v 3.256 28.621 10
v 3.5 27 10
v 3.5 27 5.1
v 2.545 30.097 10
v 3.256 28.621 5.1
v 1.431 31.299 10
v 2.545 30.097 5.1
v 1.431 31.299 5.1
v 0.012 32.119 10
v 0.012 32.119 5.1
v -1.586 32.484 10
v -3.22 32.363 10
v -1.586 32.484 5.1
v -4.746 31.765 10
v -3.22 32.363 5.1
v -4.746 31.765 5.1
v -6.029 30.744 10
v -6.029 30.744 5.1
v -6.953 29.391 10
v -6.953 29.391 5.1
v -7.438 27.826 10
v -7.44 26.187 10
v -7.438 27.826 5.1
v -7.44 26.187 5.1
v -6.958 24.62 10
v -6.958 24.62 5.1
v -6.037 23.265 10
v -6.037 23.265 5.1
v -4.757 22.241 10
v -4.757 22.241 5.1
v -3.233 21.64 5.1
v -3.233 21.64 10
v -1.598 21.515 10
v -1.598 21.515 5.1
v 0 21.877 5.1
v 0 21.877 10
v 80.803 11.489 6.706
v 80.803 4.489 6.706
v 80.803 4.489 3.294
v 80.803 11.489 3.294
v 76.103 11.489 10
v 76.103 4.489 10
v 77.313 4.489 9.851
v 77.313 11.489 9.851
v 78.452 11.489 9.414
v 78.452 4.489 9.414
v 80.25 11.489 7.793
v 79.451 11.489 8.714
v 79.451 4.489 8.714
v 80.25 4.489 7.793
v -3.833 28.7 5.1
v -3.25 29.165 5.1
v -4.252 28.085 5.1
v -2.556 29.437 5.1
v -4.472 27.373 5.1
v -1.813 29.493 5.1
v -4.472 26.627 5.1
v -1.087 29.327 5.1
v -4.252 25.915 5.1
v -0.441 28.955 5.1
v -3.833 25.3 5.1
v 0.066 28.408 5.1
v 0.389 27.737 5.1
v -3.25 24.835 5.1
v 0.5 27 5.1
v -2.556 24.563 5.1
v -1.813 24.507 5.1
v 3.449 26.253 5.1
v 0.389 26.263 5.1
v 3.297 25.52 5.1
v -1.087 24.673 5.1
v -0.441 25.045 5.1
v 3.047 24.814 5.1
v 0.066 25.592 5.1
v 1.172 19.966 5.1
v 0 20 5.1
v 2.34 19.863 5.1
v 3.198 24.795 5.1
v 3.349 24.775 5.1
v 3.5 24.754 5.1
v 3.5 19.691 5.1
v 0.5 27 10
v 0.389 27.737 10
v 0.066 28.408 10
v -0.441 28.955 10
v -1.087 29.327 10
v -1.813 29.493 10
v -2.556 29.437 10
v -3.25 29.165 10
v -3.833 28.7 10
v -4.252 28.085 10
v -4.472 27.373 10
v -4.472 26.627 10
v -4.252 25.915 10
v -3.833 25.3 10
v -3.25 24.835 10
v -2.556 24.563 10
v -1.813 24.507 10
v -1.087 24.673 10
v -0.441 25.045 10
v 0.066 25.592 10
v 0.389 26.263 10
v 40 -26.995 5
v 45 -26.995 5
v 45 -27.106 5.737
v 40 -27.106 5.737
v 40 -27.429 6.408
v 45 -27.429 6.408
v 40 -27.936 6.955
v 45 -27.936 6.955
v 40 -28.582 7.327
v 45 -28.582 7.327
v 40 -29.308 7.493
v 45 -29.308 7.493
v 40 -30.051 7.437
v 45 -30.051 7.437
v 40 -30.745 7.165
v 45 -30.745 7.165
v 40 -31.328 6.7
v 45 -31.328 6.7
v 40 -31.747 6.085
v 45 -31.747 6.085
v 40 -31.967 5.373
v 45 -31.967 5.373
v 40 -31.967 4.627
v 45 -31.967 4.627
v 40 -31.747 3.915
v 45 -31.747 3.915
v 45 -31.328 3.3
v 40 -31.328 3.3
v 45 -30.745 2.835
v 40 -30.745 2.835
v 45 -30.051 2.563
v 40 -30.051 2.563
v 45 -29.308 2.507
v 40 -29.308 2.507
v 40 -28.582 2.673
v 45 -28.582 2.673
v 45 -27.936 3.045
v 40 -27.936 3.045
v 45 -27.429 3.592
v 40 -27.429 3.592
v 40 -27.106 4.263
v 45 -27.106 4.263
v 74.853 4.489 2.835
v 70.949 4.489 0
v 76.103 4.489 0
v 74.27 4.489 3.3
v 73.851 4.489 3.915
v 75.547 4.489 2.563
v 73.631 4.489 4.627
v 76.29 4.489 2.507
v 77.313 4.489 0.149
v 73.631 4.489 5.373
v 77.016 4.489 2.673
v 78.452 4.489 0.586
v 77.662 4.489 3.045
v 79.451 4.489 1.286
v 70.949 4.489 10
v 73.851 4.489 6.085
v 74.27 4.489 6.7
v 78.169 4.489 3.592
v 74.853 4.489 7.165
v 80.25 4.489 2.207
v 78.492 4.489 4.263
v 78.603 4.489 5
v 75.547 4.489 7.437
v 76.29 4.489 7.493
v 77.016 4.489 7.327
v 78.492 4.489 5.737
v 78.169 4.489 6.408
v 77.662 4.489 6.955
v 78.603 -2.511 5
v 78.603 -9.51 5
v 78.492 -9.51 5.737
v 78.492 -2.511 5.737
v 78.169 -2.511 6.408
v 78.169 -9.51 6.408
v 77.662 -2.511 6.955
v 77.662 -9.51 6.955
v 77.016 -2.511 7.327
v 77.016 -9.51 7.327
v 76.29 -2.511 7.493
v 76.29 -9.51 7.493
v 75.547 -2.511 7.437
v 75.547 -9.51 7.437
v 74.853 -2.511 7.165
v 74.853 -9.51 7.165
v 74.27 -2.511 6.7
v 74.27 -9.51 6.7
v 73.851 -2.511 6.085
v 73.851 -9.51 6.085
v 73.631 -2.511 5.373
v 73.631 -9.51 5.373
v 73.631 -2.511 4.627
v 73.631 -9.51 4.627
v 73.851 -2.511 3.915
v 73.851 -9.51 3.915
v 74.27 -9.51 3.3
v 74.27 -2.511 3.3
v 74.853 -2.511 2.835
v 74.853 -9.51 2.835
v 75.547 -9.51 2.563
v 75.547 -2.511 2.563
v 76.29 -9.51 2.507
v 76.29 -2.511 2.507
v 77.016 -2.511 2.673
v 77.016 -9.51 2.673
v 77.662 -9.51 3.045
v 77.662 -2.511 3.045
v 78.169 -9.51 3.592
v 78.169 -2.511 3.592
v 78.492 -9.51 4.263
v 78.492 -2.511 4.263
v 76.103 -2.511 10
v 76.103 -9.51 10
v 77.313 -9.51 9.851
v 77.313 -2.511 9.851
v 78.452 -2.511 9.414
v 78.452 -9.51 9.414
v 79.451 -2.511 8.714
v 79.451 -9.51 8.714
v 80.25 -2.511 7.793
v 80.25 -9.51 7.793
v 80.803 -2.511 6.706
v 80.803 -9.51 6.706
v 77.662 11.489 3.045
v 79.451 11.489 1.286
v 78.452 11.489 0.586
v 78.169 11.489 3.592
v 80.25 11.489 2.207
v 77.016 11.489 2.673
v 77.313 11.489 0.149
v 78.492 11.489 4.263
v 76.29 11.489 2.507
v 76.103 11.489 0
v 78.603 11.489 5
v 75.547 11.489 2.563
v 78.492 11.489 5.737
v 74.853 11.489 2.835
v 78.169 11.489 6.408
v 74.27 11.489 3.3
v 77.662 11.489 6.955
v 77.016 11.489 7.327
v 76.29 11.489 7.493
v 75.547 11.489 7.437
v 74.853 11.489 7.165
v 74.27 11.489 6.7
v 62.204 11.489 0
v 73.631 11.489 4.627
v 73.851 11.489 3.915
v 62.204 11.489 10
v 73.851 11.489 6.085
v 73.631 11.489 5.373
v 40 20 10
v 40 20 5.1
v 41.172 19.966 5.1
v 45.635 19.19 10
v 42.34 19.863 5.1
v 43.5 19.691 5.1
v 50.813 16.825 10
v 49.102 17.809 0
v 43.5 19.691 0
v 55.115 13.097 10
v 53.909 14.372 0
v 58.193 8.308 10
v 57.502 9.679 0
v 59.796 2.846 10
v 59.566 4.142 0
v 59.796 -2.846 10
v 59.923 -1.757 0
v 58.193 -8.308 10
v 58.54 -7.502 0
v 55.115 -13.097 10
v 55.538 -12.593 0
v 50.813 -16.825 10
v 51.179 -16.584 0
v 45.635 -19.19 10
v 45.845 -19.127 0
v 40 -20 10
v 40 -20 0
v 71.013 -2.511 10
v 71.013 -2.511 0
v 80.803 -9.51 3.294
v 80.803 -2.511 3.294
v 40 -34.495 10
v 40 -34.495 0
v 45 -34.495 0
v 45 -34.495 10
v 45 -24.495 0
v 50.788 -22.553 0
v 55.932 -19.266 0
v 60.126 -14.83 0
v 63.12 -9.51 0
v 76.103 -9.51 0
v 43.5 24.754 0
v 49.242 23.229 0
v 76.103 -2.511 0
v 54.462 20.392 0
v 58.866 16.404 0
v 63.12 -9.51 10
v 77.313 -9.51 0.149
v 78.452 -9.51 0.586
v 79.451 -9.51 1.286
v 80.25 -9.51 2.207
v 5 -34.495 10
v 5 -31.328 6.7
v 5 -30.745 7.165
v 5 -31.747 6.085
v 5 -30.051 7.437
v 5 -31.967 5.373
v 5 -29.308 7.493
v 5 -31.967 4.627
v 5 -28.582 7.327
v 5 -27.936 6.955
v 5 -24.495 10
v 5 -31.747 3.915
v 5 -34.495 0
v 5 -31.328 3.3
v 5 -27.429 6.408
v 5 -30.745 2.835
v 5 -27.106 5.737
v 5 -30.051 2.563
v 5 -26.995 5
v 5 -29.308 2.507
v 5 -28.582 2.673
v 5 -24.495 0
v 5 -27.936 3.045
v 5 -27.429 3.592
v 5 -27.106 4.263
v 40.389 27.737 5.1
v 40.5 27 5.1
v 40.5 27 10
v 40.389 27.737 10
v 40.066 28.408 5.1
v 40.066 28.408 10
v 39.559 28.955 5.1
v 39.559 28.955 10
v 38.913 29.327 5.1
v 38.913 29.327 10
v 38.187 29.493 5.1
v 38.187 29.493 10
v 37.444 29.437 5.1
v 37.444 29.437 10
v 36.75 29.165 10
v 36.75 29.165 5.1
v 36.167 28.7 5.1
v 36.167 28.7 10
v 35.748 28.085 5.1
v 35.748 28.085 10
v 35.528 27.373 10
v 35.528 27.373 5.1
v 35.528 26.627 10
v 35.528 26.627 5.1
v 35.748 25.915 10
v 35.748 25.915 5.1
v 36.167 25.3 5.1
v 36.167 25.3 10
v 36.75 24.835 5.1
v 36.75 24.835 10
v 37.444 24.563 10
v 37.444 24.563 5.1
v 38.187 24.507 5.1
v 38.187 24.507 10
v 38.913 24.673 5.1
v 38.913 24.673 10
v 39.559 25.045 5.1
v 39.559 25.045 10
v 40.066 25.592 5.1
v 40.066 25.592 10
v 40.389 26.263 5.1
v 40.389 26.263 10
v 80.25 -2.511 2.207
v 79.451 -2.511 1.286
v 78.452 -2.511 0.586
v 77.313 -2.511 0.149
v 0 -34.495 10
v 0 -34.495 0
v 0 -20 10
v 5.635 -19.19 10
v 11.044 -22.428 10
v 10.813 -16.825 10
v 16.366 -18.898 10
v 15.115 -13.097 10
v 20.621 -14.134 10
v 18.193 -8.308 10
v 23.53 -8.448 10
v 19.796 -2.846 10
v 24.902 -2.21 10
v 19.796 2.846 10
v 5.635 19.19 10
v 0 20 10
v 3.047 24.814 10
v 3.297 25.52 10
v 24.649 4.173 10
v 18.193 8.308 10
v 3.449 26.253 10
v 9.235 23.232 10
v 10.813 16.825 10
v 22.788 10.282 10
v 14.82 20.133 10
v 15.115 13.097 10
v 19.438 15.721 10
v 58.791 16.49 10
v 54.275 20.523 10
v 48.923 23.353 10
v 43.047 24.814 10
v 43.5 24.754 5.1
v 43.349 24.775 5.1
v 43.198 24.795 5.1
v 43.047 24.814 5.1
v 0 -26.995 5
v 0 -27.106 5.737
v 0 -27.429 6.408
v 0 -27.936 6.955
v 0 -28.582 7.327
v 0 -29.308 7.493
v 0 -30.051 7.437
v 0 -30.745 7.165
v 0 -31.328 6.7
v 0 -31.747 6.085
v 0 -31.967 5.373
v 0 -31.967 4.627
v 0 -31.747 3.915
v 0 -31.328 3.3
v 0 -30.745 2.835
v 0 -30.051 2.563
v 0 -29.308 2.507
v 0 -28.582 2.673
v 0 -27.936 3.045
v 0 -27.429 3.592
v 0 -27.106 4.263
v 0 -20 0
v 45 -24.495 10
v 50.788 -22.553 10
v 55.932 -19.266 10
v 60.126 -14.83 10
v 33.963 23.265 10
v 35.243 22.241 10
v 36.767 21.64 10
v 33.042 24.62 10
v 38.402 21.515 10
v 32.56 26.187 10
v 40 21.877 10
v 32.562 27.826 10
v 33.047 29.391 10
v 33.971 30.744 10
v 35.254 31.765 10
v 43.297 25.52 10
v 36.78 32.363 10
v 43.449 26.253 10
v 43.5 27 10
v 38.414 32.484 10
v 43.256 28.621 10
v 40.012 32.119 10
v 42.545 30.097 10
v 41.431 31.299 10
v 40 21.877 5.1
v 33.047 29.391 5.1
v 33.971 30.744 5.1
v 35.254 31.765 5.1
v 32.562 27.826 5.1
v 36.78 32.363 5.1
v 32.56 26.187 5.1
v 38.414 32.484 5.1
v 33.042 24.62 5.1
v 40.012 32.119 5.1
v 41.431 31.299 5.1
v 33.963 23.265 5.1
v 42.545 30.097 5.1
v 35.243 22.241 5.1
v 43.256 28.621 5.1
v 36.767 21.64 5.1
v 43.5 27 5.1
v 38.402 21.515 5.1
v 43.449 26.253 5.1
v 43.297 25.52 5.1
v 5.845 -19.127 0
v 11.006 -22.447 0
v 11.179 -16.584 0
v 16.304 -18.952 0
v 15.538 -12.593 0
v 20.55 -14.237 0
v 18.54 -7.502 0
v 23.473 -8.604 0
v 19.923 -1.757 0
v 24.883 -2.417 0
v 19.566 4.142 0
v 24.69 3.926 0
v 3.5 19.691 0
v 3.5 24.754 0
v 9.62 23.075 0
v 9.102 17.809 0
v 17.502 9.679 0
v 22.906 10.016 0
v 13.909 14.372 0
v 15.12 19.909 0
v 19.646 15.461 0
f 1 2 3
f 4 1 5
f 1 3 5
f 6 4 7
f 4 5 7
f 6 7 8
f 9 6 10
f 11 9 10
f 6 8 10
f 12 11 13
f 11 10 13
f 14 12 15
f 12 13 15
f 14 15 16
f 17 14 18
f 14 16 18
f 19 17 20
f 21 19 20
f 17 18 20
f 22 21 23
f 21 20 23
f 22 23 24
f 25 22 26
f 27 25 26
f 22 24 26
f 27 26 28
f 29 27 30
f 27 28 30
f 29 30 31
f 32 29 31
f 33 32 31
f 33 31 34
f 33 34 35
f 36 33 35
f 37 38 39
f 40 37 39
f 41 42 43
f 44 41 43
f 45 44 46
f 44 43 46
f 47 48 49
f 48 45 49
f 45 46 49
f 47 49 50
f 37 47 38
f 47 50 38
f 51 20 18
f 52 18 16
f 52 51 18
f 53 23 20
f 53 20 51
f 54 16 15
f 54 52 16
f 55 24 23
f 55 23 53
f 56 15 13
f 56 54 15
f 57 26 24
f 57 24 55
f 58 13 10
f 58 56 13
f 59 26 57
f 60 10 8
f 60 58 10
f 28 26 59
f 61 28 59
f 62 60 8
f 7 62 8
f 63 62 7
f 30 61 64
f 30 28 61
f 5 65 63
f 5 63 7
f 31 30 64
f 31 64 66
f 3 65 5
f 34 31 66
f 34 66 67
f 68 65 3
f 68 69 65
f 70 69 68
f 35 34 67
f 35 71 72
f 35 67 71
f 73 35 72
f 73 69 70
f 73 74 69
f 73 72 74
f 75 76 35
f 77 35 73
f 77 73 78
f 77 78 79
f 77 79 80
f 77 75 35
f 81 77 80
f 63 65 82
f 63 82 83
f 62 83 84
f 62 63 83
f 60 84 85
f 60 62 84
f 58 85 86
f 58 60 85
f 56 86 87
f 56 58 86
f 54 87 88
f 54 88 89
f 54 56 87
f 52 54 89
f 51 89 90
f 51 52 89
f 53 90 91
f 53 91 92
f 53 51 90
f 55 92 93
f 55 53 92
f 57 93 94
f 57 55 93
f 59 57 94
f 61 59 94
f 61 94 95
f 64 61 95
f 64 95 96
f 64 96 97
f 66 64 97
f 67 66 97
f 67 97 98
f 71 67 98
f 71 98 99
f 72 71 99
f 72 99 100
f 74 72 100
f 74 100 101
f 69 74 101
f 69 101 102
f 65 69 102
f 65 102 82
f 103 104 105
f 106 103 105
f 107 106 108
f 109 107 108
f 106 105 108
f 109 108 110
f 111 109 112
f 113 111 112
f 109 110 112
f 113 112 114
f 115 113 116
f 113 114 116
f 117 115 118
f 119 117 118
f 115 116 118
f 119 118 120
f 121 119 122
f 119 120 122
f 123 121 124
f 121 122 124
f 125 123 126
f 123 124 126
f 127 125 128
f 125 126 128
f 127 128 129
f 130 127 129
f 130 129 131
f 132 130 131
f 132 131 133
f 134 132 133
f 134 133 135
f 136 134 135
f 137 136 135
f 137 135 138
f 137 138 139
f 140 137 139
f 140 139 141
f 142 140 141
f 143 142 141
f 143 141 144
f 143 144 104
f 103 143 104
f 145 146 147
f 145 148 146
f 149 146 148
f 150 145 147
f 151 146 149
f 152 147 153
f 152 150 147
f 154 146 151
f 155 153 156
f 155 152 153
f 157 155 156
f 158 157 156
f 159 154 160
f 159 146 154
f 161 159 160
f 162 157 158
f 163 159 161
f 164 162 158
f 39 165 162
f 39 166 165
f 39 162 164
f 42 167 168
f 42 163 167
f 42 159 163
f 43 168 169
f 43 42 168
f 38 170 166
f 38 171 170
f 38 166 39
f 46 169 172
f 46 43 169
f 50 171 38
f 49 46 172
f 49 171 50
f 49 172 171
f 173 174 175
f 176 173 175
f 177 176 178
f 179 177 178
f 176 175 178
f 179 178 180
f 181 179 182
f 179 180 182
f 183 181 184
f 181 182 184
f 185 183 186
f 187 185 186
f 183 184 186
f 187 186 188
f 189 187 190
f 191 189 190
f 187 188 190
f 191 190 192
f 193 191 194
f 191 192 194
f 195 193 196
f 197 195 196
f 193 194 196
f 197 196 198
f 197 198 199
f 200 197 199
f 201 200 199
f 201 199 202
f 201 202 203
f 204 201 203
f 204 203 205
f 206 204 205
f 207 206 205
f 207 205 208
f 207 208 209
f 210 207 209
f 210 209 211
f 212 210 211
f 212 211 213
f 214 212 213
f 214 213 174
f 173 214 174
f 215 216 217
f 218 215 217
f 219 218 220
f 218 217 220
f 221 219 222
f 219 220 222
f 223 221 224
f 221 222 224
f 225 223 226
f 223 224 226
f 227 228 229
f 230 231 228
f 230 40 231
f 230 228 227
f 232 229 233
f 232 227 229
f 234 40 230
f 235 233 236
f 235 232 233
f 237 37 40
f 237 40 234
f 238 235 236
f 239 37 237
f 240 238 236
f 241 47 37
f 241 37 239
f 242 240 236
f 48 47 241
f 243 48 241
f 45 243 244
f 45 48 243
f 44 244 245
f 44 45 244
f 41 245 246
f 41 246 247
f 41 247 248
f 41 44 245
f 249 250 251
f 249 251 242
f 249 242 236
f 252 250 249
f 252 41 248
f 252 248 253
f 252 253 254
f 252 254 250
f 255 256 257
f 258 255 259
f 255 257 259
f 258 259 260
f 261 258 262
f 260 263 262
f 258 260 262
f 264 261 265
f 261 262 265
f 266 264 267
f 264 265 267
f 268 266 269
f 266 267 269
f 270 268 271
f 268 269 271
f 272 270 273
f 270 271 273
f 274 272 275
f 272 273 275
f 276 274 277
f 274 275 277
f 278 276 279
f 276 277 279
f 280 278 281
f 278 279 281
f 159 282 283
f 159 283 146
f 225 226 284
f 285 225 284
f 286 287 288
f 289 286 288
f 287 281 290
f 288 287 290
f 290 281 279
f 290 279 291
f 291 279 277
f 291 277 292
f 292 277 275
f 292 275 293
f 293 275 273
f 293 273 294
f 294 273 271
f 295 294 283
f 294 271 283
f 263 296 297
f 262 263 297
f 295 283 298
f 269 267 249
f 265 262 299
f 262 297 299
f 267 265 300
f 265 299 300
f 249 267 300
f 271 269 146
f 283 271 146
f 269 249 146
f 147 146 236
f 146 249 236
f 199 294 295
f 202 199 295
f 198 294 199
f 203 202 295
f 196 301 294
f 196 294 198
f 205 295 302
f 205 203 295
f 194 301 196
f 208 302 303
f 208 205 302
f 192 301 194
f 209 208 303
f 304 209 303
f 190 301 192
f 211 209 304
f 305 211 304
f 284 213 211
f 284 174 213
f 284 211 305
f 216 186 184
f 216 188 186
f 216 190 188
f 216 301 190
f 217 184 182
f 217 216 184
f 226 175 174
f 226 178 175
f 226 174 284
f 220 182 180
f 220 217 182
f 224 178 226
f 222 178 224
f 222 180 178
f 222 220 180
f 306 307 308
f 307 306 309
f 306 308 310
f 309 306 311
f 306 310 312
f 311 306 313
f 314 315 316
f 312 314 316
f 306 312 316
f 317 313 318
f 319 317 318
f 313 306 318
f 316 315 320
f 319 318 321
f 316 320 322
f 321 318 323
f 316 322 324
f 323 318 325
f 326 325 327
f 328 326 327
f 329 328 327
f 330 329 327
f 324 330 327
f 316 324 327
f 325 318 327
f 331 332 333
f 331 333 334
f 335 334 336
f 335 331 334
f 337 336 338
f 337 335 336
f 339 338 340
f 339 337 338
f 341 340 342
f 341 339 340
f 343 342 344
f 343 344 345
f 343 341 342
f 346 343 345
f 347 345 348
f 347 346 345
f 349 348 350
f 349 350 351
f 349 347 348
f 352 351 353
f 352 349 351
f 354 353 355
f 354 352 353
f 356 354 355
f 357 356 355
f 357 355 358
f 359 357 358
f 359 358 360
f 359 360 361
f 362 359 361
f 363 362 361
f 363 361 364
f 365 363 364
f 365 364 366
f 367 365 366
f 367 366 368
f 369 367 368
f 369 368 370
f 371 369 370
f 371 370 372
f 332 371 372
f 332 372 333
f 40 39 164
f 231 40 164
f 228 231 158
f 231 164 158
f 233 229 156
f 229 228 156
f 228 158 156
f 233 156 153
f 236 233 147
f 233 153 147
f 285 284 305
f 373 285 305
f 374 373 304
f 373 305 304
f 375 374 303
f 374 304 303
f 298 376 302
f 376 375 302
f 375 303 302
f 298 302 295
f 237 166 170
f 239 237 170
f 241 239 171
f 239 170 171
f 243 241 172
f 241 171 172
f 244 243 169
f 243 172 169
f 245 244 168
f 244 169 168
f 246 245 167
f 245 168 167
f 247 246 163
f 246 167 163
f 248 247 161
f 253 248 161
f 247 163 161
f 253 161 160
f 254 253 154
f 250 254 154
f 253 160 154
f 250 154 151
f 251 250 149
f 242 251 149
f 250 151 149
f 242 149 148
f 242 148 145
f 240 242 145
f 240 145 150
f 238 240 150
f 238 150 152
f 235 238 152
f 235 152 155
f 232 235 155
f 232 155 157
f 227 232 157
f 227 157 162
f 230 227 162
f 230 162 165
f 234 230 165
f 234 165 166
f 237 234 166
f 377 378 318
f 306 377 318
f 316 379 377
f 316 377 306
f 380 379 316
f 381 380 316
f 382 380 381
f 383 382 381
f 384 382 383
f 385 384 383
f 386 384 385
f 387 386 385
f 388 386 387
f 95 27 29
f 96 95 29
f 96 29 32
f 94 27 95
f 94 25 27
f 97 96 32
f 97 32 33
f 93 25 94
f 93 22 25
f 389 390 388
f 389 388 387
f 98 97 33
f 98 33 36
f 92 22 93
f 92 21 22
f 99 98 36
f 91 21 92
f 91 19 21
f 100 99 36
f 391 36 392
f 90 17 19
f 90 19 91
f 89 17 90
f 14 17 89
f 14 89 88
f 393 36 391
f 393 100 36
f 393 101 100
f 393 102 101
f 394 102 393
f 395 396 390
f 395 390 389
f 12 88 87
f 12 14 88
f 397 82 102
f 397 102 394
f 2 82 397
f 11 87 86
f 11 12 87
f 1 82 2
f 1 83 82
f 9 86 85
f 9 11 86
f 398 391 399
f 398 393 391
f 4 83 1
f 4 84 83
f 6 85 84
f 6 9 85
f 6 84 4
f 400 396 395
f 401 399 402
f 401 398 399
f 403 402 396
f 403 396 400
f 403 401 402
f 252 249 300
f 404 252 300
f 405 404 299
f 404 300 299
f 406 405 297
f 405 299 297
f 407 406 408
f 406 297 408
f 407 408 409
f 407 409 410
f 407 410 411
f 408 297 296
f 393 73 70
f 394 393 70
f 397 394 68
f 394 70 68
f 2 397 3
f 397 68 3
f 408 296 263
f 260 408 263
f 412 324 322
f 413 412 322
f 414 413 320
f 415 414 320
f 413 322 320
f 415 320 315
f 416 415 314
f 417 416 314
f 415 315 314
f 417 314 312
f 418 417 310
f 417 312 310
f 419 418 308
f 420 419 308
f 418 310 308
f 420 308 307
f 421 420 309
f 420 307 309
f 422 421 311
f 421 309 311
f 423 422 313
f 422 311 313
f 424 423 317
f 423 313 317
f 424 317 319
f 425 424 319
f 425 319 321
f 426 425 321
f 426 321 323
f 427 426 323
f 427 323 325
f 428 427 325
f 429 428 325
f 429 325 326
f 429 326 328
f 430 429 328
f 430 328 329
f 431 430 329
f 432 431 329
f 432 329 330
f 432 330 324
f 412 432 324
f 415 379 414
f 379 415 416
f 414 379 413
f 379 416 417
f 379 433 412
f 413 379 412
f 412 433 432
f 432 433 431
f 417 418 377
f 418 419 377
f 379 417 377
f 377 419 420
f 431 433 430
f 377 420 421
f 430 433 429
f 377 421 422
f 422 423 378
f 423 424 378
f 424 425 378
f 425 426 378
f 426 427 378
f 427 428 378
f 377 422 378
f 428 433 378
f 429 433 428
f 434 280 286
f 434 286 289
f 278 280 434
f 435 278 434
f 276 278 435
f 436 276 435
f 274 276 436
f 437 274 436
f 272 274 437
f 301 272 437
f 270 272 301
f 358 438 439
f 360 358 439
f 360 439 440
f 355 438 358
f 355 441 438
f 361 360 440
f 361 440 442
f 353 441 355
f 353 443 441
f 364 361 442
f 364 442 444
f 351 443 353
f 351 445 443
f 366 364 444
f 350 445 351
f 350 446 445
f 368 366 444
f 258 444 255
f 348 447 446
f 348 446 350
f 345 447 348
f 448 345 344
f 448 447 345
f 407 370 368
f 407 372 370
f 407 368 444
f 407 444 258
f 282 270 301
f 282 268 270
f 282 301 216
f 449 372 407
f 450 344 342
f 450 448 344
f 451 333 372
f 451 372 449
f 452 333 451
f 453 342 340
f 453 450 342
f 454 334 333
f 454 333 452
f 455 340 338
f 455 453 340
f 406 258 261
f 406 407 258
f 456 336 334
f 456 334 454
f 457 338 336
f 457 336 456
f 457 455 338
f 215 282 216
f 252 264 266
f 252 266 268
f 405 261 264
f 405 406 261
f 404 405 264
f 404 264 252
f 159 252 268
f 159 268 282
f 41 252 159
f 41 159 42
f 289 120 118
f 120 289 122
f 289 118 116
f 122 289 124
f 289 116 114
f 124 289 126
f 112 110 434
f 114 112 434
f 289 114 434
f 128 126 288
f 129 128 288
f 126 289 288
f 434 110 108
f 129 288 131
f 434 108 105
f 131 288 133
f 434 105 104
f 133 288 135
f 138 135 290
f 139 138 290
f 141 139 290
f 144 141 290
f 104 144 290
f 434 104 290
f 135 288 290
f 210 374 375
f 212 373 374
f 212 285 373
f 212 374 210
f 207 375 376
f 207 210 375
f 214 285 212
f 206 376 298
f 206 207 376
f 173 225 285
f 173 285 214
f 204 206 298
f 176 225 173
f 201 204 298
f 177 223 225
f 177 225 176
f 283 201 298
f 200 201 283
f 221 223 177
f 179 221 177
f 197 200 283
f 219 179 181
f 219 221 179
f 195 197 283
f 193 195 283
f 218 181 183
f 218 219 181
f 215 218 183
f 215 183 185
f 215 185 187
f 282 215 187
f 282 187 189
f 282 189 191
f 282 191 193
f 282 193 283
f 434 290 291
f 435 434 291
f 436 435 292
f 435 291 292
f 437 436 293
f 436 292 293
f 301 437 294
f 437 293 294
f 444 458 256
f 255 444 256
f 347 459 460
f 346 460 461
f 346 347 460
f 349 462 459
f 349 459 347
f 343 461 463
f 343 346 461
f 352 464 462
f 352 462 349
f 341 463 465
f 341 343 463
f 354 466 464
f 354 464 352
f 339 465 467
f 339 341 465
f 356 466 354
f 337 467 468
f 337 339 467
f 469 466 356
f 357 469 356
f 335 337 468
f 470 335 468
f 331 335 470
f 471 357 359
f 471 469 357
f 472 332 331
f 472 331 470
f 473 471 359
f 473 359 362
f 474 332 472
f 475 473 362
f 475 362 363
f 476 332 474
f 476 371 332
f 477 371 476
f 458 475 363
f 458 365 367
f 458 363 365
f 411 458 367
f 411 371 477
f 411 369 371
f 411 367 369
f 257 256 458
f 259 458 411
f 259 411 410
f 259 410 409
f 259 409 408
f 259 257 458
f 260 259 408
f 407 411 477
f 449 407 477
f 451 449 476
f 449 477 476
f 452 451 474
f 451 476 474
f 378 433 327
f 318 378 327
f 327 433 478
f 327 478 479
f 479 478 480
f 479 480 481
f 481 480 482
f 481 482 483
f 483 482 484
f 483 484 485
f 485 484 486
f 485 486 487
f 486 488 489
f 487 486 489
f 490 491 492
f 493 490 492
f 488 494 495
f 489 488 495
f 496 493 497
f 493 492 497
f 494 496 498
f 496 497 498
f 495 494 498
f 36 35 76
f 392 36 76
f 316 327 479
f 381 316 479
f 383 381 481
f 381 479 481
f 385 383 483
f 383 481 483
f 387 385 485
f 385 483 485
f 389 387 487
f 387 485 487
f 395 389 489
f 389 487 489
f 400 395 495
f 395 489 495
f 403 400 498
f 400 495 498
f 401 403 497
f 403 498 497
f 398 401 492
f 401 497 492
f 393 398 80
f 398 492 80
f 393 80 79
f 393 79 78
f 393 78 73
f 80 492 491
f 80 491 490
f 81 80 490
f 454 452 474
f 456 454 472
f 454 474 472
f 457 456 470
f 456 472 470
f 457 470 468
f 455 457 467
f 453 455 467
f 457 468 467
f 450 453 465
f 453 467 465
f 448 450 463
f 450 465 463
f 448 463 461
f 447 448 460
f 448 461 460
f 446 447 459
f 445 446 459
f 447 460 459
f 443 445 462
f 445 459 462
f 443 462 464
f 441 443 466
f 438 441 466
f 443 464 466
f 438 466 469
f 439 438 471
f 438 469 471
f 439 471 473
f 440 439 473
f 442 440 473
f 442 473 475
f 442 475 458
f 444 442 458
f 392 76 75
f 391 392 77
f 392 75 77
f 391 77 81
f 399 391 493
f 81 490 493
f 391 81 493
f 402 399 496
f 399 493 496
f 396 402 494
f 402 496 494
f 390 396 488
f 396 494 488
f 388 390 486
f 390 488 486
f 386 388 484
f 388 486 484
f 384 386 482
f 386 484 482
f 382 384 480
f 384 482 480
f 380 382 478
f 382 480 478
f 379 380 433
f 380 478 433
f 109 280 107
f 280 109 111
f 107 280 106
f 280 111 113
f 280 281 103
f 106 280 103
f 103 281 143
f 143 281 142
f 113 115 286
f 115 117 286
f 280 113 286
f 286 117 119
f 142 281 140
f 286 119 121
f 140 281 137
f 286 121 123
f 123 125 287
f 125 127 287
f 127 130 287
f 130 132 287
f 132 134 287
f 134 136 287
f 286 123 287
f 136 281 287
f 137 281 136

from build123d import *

# Parameters (mm, degrees)
F0_R      = 2.5
F1_DEPTH  = 10
F3_DEPTH  = 5.1
F4_R      = 2.5
F5_DEPTH  = 25
F8_DEPTH  = 10
F9_R      = 2.5
F10_DEPTH = 25
F12_DEPTH = 25


with BuildPart() as f1:
    # F0 (on Top) → F1 (new body)
    with BuildSketch(Plane.XY):
        with BuildLine():
            ThreePointArc((0, 20), (20, 0), (0, -20))
            Line((0, -20), (0, -25))
            Line((0, -25), (0, -34.4948974278))
            Line((0, -34.4948974278), (5, -34.4948974278))
            Line((5, -34.4948974278), (5, -24.4948974278))
            ThreePointArc((5, -24.4948974278), (24.9804087413, 0.9895347988), (3.0467684263, 24.8136495131))
            ThreePointArc((3.0467684263, 24.8136495131), (1.8171863954, 23.0403171815), (0, 21.876524617))
            Line((0, 21.876524617), (0, 20))
        make_face()
        with BuildLine():
            ThreePointArc((3.5, 27), (-6.5414755311, 30.1024184115), (0, 21.876524617))
            Line((0, 21.876524617), (0, 25))
            ThreePointArc((0, 25), (1.526231007, 24.9533688891), (3.0467684263, 24.8136495131))
            ThreePointArc((3.0467684263, 24.8136495131), (3.3855002713, 25.8835830403), (3.5, 27))
        make_face()
        with Locations((-2, 27)):
            Circle(F0_R, mode=Mode.SUBTRACT)
        with BuildLine():
            Line((0, 25), (0, 21.876524617))
            ThreePointArc((0, 21.876524617), (1.8171863954, 23.0403171815), (3.0467684263, 24.8136495131))
            ThreePointArc((3.0467684263, 24.8136495131), (1.526231007, 24.9533688891), (0, 25))
        make_face()
    extrude(amount=F1_DEPTH)

    # F2 (on face) → F3 (cut)
    with BuildSketch(Plane(origin=(0, 0, 0), x_dir=(1, 0, 0), z_dir=(0, 0, -1))):
        with BuildLine():
            ThreePointArc((0, -21.876524617), (-6.5414755311, -30.1024184115), (3.5, -27))
            Line((3.5, -27), (3.5, -15.0508275256))
            Line((3.5, -15.0508275256), (0, -15.0508275256))
            Line((0, -15.0508275256), (0, -21.876524617))
        make_face()
    extrude(amount=-F3_DEPTH, mode=Mode.SUBTRACT)

    # F4 (on face) → F5 (cut)
    with BuildSketch(Plane.YZ.offset(5)):
        with Locations((-29.4948974278, 5)):
            Circle(F4_R)
    extrude(amount=-F5_DEPTH, mode=Mode.SUBTRACT)


with BuildPart() as f6_1:
    # F6: copy of F1
    add(f1.part.moved(Location((40, 0, 0))))

    # F7 (on face) → F8 (join)
    with BuildSketch(Plane.XY.offset(10)):
        Polygon((61.0121913655, -2.5110482576), (61.0760738386, -9.5104652012), (71.0764903249, -9.5104652012), (81.1029541338, -9.5104652012), (81.0126078518, -2.5110482576), (71.0126078518, -2.5110482576), (70.9487227179, 4.4886602141), (80.8852514097, 4.4886602141), (80.8852514097, 11.4886602141), (60.8844184371, 11.4886602141), (60.9483062317, 4.4886602141), align=None)
    extrude(amount=-F8_DEPTH)

    # F9 (on face) → F10 (cut)
    with BuildSketch(Plane.XZ.offset(9.5104652012)):
        with Locations((76.1029541338, 5)):
            Circle(F9_R)
    extrude(amount=-F10_DEPTH, mode=Mode.SUBTRACT)

    # F11 (on face) → F12 (cut)
    with BuildSketch(Plane.XZ.offset(9.5104652012)):
        with BuildLine():
            ThreePointArc((80.8029541338, 6.7058722109), (81.0273830347, 5.8660254038), (81.1029541338, 5))
            Line((81.1029541338, 5), (81.1029541338, 10))
            Line((81.1029541338, 10), (80.8029541338, 10))
            Line((80.8029541338, 10), (80.8029541338, 6.7058722109))
        make_face()
        with BuildLine():
            ThreePointArc((76.1029541338, 10), (78.9726787674, 9.094469505), (80.8029541338, 6.7058722109))
            Line((80.8029541338, 6.7058722109), (80.8029541338, 10))
            Line((80.8029541338, 10), (76.1029541338, 10))
        make_face()
        with BuildLine():
            ThreePointArc((81.1029541338, 5), (81.0273830347, 4.1339745962), (80.8029541338, 3.2941277891))
            Line((80.8029541338, 3.2941277891), (80.8029541338, 0))
            Line((80.8029541338, 0), (80.9755950309, 0))
            Line((80.9755950309, 0), (81.1029541338, 0))
            Line((81.1029541338, 0), (81.1029541338, 5))
        make_face()
        with BuildLine():
            ThreePointArc((80.8029541338, 3.2941277891), (78.9726787674, 0.905530495), (76.1029541338, 0))
            Line((76.1029541338, 0), (80.8029541338, 0))
            Line((80.8029541338, 0), (80.8029541338, 3.2941277891))
        make_face()
        with BuildLine():
            Line((80.8029541338, 6.7058722109), (80.8029541338, 3.2941277891))
            ThreePointArc((80.8029541338, 3.2941277891), (81.0273830347, 4.1339745962), (81.1029541338, 5))
            ThreePointArc((81.1029541338, 5), (81.0273830347, 5.8660254038), (80.8029541338, 6.7058722109))
        make_face()
    extrude(amount=-F12_DEPTH, mode=Mode.SUBTRACT)


solid = Compound([f1.part, f6_1.part])
